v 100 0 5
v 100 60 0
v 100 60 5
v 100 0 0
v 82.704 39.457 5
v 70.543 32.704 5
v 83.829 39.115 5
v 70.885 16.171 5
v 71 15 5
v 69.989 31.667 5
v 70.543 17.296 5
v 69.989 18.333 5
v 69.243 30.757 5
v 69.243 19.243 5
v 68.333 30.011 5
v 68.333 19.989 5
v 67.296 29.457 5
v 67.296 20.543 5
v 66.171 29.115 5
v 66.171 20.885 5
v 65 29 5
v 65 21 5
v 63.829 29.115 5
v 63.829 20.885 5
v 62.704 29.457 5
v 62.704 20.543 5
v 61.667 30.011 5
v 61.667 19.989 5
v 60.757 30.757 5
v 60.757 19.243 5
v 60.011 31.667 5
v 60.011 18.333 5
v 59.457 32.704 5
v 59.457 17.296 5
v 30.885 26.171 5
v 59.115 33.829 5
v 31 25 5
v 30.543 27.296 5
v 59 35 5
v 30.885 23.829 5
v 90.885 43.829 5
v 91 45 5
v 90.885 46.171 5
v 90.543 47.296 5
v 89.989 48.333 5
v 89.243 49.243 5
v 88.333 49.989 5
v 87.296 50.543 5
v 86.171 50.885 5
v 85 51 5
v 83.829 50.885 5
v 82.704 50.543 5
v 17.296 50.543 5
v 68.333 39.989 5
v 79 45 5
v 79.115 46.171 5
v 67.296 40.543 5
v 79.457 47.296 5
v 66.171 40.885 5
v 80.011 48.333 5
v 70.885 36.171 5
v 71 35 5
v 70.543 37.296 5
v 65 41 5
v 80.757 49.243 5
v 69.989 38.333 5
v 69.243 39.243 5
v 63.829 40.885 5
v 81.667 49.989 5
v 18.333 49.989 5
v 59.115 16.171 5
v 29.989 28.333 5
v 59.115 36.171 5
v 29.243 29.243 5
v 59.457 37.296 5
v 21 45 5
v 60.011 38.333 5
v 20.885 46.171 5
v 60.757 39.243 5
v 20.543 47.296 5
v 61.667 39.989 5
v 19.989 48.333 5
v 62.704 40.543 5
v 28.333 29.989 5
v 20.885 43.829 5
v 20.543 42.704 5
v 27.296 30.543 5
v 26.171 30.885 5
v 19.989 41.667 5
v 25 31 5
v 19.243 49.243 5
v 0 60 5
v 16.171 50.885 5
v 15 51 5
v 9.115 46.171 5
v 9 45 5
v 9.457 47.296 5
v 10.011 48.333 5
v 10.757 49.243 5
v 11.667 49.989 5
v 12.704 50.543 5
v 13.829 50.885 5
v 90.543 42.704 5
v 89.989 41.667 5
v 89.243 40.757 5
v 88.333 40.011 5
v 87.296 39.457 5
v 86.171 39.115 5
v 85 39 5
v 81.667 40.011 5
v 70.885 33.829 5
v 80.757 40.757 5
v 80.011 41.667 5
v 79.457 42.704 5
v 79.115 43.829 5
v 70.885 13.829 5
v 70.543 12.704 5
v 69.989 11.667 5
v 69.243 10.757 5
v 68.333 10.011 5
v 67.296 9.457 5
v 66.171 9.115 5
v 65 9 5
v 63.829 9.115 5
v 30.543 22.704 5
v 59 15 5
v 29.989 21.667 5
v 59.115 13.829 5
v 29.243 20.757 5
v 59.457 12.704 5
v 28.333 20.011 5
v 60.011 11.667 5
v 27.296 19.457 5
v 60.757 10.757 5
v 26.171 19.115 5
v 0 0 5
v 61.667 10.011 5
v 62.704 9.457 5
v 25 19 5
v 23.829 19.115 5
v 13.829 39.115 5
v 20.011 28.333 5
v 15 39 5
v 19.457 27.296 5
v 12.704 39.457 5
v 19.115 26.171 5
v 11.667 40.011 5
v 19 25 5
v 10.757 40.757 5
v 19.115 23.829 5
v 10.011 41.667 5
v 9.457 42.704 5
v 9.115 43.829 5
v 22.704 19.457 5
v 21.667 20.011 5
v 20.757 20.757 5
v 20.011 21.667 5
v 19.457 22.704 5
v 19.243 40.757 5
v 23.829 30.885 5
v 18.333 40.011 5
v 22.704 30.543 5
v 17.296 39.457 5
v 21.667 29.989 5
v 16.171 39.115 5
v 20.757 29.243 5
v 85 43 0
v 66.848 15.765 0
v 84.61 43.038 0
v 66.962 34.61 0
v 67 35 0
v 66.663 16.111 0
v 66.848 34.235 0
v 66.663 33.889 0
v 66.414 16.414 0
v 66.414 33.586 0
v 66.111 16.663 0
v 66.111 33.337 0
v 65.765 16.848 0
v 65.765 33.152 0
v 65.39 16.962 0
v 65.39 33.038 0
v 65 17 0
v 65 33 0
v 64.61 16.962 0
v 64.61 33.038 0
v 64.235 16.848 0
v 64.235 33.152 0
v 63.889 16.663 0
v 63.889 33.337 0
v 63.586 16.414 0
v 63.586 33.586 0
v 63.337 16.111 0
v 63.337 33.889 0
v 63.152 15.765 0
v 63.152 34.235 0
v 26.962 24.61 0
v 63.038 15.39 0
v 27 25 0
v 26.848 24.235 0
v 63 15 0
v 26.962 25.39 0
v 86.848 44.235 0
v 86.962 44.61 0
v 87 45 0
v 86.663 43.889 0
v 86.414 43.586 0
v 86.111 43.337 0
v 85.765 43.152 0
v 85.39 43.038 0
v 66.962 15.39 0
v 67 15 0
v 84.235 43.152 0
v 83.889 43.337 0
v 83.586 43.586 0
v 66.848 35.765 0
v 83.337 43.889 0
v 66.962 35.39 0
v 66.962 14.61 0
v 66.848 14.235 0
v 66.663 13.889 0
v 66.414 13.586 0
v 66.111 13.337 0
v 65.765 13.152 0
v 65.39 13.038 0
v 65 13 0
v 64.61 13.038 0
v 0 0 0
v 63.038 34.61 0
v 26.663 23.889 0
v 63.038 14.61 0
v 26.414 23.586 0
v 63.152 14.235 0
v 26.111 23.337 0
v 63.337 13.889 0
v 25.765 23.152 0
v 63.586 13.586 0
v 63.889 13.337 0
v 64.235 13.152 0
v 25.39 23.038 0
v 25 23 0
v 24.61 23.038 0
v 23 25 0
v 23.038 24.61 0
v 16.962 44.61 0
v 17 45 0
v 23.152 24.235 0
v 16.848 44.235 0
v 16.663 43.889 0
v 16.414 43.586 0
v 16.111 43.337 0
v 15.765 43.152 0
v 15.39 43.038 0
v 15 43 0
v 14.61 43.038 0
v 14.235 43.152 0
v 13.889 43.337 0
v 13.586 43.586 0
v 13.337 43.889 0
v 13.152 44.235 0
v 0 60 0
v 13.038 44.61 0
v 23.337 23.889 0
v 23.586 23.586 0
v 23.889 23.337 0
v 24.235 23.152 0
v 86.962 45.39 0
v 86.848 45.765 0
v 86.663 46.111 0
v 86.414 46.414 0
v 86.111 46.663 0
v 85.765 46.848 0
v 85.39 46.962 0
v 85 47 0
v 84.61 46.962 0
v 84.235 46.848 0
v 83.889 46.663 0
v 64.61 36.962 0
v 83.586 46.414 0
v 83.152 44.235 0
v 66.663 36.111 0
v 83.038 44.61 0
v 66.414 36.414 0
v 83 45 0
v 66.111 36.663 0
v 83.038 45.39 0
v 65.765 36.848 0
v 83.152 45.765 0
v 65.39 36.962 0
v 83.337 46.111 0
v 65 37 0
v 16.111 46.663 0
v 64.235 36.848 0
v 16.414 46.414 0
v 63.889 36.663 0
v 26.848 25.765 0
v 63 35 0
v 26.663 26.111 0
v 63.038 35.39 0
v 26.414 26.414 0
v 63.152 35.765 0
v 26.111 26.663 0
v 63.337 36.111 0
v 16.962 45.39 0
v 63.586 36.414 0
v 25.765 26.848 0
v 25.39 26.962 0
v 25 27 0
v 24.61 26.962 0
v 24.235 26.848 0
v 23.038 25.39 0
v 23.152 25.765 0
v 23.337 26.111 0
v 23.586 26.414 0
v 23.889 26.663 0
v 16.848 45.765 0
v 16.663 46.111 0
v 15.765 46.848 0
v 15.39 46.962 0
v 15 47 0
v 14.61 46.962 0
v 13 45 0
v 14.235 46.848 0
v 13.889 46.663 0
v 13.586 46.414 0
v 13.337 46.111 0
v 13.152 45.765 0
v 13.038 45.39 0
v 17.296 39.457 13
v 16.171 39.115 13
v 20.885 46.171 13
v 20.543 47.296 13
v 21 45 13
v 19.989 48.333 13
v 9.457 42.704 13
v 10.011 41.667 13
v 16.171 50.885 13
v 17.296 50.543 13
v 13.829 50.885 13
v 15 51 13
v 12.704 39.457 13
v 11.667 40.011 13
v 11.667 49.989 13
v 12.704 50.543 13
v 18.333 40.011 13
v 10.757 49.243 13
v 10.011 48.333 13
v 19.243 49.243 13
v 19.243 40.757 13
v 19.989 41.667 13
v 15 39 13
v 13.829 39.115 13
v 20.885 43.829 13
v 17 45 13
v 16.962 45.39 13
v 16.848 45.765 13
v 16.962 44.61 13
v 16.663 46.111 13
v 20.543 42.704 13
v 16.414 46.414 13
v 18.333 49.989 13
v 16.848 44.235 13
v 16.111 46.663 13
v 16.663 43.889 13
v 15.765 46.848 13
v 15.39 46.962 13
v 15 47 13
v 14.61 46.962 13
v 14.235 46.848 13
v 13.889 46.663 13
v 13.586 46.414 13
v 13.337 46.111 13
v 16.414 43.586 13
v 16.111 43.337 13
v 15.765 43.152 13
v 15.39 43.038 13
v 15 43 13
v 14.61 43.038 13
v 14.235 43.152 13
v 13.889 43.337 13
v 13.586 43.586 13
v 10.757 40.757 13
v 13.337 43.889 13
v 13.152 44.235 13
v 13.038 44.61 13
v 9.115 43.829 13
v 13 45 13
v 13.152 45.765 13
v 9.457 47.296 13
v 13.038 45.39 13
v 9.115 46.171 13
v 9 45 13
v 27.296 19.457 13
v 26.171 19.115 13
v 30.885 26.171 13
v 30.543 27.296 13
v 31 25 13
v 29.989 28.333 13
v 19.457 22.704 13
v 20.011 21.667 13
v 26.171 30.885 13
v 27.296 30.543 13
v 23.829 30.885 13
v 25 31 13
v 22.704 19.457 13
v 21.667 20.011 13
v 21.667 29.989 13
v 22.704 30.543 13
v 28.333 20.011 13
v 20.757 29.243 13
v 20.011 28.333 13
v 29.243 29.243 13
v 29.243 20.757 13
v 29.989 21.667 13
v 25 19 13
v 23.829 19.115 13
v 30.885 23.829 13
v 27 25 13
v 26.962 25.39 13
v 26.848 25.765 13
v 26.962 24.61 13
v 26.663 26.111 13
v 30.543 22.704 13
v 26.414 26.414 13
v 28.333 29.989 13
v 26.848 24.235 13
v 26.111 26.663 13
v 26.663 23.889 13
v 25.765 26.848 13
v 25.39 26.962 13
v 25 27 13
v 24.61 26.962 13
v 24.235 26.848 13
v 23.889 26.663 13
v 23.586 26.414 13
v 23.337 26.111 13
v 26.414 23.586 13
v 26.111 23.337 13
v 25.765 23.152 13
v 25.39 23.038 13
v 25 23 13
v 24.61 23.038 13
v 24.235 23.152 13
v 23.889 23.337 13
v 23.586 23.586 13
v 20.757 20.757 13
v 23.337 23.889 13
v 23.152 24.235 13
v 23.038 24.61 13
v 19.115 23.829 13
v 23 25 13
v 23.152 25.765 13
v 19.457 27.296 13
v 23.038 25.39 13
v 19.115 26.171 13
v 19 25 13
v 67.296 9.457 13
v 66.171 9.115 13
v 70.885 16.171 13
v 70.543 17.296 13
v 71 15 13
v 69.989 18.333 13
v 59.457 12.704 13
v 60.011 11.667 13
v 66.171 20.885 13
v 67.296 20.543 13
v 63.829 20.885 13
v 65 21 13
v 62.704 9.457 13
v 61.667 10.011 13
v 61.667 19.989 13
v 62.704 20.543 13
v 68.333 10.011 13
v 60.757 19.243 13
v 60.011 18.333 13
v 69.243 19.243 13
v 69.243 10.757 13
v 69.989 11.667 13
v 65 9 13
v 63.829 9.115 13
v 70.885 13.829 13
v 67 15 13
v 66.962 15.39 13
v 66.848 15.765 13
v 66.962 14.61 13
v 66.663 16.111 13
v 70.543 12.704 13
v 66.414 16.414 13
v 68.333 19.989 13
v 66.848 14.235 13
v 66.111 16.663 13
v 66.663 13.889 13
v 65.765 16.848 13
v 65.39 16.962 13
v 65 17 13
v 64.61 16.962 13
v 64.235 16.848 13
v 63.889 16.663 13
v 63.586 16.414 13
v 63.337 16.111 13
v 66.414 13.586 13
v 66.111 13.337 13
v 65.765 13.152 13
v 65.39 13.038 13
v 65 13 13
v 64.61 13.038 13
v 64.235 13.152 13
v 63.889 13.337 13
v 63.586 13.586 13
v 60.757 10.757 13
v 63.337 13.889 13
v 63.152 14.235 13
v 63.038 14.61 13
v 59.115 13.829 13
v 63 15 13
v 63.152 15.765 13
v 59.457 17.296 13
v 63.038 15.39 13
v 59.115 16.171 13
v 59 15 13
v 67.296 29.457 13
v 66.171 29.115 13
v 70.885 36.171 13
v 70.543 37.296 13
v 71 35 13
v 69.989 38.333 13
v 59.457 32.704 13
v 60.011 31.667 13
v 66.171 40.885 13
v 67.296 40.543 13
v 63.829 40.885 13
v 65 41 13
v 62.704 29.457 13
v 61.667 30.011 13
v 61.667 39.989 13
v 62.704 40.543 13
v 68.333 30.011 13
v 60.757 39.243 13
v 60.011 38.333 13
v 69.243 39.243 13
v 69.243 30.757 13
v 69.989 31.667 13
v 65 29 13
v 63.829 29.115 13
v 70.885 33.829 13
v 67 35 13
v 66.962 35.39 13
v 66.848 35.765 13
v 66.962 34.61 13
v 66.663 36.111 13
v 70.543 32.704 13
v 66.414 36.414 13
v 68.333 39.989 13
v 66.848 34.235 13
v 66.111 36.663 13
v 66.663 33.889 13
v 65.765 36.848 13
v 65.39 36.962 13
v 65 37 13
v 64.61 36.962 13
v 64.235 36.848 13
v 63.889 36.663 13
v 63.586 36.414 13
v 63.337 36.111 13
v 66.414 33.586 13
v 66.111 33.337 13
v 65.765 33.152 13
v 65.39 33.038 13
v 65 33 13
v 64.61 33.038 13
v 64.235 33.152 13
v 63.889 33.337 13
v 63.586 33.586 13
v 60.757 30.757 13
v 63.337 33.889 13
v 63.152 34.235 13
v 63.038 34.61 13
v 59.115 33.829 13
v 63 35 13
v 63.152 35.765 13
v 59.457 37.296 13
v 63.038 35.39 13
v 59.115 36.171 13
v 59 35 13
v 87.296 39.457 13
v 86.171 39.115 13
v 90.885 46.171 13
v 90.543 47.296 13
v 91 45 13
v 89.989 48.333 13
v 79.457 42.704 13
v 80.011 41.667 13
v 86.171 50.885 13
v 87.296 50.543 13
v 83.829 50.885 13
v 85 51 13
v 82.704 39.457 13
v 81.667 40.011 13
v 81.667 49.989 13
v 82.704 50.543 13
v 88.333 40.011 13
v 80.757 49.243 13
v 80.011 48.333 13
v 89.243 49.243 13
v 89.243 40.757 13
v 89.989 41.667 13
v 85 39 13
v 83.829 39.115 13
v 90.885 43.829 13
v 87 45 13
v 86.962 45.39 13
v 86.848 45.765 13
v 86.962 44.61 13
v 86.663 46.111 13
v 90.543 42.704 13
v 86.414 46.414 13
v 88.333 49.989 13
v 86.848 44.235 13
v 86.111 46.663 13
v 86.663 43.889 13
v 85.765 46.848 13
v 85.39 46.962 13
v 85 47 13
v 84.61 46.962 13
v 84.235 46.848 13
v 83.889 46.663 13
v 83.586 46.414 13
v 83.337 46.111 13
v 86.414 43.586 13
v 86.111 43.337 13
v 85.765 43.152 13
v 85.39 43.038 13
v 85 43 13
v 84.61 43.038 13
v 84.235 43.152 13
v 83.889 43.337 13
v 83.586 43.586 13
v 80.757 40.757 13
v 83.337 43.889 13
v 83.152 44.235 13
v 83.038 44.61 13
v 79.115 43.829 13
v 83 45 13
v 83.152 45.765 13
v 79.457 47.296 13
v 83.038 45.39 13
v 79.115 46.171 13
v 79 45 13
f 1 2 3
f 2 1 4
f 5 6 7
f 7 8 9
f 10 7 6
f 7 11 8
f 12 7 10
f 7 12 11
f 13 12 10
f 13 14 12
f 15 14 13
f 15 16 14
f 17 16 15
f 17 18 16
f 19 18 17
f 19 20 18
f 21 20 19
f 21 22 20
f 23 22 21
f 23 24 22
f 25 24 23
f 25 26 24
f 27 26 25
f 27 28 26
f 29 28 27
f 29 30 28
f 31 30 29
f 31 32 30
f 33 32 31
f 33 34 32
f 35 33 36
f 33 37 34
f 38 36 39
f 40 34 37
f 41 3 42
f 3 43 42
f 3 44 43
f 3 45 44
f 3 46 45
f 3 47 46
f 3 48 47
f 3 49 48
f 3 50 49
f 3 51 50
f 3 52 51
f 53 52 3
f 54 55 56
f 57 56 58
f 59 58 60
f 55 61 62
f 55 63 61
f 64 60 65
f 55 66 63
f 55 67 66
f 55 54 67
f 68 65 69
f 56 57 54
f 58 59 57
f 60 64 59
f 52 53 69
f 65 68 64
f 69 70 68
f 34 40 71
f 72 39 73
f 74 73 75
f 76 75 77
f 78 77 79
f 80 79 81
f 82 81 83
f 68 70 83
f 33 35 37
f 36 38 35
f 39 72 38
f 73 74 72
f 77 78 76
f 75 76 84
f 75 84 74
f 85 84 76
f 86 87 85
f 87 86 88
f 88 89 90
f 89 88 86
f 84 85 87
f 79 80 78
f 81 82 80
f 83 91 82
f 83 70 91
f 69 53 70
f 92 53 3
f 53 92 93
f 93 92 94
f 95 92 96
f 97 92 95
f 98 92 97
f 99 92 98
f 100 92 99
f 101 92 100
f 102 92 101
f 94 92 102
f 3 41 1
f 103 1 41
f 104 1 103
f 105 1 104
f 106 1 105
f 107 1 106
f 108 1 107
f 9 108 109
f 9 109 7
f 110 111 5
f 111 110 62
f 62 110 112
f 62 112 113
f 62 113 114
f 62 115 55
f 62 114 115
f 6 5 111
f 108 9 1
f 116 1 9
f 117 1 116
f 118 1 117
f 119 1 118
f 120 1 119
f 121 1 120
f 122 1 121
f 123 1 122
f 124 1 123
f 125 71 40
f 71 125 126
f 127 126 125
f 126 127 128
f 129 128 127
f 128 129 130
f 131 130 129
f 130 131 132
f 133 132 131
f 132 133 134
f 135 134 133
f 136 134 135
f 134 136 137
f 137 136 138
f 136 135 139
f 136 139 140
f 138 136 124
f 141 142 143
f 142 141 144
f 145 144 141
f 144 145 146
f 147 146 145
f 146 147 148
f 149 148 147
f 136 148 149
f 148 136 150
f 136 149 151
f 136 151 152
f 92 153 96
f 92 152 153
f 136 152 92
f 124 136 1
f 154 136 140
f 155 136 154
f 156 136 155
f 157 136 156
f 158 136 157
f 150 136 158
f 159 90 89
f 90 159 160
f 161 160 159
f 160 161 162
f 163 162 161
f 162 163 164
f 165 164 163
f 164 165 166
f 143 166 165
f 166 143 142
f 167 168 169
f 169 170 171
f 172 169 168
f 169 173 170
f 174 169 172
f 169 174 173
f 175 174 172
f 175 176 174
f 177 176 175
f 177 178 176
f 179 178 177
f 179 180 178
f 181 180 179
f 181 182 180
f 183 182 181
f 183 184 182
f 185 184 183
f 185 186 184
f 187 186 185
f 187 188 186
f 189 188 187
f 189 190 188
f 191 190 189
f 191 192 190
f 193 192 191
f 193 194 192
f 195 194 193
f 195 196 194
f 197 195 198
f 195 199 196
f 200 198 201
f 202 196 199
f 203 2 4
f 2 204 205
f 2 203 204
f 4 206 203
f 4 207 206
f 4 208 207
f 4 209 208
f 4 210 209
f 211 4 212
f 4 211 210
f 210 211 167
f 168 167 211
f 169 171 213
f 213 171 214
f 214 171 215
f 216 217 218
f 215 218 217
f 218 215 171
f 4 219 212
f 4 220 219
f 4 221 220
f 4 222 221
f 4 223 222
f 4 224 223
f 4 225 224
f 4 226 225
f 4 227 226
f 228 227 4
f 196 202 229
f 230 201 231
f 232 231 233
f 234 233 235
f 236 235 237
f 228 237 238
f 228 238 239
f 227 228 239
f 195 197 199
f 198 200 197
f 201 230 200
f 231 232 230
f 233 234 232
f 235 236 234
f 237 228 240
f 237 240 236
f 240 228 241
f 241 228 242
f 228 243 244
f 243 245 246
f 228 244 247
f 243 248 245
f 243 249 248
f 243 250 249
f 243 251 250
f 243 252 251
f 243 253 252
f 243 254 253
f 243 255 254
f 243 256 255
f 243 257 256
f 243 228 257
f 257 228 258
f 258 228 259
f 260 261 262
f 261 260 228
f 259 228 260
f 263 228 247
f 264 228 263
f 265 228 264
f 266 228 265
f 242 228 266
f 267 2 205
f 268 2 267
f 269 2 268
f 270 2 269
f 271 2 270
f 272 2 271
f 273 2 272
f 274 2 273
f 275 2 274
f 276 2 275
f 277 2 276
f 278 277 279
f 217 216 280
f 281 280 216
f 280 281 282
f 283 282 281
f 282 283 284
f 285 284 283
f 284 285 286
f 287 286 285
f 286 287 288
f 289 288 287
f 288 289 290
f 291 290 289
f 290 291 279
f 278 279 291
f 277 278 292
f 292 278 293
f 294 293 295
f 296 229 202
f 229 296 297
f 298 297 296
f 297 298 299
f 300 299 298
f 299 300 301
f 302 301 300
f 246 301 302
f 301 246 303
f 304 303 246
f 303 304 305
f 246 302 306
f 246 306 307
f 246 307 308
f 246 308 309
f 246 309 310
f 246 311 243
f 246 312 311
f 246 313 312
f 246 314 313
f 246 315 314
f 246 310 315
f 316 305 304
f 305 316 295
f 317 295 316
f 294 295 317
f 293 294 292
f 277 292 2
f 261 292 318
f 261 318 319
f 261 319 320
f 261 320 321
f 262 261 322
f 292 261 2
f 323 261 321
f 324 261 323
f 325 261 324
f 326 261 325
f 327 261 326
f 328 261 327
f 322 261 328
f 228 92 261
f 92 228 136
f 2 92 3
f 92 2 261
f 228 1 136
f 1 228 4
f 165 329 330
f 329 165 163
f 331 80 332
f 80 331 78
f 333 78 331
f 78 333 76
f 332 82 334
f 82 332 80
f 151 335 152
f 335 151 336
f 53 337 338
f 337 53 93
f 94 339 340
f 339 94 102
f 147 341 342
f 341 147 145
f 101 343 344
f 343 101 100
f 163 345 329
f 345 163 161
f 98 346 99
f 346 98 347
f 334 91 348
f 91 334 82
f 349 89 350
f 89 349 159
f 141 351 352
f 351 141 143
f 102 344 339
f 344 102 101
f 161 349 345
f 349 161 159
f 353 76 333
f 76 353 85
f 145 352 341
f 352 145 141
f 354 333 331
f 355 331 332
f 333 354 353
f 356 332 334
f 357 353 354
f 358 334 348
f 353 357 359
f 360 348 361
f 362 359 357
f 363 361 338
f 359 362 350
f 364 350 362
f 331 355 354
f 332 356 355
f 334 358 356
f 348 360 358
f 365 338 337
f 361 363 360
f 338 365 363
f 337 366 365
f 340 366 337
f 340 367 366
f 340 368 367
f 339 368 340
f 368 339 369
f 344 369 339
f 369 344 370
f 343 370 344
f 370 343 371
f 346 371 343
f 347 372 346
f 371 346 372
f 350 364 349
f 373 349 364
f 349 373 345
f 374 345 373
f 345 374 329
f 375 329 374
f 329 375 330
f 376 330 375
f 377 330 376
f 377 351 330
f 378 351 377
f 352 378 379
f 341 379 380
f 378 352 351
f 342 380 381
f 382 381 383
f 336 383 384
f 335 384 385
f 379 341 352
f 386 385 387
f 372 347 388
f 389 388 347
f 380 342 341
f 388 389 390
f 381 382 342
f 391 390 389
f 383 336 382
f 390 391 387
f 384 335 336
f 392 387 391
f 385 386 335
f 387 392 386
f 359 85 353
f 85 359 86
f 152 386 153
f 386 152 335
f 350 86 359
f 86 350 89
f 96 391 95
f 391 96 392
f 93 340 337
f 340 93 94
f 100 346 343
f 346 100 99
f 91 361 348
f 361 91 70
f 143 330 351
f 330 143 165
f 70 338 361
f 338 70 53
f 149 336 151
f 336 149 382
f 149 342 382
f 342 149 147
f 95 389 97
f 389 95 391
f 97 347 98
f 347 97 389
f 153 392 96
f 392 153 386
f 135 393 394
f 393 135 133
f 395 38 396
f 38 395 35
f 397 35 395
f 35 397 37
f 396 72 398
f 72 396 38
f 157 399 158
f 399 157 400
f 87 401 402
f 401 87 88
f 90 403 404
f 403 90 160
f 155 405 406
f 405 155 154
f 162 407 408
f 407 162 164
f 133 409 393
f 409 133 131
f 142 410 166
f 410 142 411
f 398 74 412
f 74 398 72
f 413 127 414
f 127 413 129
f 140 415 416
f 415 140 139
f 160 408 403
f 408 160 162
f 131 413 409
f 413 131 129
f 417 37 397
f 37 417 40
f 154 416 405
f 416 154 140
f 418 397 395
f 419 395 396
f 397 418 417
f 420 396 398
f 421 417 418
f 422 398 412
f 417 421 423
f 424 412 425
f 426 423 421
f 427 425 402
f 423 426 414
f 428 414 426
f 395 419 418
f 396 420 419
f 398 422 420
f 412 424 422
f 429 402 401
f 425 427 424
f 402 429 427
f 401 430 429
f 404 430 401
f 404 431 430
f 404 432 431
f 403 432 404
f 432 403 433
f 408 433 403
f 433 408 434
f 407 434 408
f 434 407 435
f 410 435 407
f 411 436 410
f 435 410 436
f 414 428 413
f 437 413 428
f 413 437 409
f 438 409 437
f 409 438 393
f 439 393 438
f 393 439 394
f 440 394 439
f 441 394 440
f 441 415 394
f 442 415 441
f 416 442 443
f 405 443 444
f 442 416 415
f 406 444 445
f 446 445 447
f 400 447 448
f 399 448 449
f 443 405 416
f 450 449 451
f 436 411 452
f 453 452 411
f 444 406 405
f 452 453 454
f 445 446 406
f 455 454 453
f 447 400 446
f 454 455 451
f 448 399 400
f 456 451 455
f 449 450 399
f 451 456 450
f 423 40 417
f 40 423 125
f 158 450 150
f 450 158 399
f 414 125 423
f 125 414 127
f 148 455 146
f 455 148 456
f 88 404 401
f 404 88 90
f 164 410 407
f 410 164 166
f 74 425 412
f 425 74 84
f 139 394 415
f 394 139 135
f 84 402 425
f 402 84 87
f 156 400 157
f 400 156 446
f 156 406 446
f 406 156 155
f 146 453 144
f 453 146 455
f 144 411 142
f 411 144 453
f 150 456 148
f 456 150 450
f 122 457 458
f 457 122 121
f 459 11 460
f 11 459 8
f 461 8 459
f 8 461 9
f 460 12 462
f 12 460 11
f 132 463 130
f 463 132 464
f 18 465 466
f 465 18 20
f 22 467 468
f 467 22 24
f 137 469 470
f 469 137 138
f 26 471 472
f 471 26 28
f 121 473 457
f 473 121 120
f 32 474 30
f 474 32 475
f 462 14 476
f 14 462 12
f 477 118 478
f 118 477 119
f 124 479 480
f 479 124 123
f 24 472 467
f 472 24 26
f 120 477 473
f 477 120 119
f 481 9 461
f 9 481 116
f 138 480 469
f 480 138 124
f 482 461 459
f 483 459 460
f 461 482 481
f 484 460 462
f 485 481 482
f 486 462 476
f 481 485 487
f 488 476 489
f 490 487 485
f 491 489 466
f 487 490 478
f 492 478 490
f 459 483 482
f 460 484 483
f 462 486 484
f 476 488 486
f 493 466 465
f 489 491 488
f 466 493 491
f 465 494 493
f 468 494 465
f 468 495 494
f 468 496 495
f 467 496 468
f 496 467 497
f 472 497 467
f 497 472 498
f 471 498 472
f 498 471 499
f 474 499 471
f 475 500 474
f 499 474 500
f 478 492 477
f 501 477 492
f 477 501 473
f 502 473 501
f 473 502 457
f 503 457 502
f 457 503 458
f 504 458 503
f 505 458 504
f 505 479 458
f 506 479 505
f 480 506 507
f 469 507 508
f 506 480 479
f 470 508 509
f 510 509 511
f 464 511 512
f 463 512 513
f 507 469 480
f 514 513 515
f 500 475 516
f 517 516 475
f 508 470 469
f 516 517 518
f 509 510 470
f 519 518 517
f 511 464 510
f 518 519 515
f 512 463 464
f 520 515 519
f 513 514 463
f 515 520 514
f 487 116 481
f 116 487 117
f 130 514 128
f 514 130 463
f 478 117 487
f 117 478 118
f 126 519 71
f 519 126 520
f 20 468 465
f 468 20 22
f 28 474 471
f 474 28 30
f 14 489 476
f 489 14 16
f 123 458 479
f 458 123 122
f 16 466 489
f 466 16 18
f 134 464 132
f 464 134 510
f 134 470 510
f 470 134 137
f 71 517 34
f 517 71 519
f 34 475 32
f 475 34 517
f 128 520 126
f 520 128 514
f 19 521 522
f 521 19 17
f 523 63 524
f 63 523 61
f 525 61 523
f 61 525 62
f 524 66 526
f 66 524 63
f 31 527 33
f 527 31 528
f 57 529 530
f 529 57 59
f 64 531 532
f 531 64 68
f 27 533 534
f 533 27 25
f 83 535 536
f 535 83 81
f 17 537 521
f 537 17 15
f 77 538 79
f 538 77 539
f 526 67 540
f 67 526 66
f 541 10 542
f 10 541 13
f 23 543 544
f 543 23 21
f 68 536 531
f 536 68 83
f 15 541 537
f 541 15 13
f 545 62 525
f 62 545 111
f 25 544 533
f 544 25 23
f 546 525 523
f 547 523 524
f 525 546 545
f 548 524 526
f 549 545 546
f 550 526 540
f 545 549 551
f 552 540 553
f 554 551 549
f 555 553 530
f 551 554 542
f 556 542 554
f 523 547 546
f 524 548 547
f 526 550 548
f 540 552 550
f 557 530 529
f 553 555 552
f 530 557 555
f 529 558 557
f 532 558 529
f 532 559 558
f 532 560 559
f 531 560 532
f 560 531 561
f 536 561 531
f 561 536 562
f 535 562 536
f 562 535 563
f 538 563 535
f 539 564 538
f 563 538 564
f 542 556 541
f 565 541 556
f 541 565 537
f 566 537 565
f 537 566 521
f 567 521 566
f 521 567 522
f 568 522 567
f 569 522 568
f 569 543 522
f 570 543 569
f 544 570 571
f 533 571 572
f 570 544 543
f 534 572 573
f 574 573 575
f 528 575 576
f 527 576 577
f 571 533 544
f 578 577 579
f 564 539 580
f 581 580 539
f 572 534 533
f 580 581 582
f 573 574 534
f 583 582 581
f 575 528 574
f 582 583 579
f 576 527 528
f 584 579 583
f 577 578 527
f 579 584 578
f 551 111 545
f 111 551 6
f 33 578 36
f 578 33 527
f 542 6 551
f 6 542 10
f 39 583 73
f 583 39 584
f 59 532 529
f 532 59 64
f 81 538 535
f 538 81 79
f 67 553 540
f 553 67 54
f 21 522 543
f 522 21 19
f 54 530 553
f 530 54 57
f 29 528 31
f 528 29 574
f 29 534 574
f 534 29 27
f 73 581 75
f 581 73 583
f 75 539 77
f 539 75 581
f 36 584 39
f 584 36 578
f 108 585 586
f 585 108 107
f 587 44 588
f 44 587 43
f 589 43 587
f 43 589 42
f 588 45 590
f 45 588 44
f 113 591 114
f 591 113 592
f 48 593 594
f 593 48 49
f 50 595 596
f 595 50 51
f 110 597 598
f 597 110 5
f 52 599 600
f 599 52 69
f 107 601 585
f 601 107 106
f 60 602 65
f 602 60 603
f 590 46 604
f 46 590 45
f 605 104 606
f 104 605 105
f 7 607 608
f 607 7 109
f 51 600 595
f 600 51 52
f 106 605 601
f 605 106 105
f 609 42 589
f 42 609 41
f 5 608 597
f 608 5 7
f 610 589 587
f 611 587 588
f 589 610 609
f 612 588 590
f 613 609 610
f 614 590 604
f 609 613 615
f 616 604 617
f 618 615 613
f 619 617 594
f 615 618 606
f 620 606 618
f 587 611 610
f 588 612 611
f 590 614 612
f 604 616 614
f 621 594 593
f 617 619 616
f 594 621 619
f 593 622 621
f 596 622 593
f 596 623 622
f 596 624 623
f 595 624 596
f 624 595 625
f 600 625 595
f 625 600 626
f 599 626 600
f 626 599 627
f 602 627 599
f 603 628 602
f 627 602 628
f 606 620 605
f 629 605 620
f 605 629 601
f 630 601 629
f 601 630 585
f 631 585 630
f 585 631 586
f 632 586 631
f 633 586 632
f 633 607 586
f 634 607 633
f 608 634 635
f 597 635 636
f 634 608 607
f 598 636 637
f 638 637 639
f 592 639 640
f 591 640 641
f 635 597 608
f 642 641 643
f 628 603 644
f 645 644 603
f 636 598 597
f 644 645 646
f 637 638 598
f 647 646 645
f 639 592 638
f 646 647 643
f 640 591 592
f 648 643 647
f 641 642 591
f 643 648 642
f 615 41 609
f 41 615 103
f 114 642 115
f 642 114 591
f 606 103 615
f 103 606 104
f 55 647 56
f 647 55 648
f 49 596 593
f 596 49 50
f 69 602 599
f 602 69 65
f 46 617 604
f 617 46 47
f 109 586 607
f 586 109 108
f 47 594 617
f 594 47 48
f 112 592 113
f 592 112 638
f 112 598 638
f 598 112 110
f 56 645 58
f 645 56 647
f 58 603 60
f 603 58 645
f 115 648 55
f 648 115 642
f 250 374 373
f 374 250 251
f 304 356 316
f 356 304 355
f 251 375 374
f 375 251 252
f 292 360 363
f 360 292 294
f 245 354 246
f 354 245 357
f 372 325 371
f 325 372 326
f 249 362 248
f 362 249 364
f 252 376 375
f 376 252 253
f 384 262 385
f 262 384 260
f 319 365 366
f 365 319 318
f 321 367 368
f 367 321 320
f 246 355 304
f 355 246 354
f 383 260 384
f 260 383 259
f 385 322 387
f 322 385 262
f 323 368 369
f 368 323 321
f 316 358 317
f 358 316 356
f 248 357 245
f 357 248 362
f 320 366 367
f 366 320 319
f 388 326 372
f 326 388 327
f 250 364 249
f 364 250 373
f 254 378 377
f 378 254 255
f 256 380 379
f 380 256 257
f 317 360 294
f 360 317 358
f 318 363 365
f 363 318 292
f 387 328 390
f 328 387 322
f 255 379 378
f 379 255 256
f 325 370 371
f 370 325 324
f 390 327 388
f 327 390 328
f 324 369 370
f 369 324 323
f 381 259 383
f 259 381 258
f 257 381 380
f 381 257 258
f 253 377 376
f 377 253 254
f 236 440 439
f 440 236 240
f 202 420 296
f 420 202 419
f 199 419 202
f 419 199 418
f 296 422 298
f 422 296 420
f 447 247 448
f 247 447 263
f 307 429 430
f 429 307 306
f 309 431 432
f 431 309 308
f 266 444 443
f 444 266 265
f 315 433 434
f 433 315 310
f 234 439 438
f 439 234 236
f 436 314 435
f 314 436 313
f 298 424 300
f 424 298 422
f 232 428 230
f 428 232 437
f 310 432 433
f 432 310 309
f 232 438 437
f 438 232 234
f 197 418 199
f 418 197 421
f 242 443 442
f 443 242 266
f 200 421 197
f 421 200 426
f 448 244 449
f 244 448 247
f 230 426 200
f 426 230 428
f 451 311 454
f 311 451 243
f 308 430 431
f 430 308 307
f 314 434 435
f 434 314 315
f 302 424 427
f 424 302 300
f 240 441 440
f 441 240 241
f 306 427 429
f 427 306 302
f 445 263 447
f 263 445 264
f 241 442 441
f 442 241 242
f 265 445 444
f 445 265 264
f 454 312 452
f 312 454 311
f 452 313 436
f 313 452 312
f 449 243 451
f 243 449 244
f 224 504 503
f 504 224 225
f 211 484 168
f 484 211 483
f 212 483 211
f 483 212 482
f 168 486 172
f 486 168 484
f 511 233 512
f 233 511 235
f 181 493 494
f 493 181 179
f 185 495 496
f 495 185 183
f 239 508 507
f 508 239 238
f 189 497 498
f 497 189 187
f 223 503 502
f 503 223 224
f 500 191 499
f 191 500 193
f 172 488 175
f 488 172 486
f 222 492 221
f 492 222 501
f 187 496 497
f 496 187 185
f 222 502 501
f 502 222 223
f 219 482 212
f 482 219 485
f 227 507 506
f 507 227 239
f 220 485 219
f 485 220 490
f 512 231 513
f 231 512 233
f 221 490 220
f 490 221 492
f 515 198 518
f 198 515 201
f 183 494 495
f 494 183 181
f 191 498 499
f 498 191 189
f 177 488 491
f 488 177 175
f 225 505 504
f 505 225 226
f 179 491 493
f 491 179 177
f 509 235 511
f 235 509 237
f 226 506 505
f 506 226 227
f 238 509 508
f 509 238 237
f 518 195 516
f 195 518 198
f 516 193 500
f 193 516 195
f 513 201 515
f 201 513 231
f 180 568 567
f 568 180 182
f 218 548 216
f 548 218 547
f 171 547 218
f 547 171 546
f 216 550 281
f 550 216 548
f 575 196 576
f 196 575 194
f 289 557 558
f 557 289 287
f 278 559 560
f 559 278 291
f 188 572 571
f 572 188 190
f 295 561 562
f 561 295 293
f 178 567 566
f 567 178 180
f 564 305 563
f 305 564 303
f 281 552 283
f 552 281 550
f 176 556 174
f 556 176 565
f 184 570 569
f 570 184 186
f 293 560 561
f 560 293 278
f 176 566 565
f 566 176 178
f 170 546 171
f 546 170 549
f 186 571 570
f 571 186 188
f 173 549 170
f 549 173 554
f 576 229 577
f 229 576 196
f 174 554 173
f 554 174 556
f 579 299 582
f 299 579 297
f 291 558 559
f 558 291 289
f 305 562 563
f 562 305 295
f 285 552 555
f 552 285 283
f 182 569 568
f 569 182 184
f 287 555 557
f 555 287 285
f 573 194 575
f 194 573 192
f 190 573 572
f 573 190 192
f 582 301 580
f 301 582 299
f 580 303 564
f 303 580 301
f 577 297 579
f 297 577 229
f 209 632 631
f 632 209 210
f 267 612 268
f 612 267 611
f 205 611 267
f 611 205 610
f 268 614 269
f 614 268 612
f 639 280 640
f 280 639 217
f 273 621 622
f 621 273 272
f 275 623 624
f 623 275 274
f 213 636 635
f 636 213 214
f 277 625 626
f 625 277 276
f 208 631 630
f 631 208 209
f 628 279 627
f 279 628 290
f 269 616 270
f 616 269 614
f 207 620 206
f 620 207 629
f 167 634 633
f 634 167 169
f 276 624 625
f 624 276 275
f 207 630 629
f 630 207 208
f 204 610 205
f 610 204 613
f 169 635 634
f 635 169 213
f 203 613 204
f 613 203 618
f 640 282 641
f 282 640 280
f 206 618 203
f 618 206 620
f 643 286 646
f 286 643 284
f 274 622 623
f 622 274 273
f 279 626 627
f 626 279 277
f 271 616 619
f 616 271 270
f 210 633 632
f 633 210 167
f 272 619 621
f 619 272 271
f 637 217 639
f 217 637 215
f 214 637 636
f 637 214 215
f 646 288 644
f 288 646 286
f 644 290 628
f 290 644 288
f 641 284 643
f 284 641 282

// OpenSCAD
$fn = 32;

// ----------------------------------------------------------------------
// Boss field: plate with bosses at given coordinates
// ----------------------------------------------------------------------

// --- parameters (mm) ---
plate_l = 100;            // plate length, X
plate_w = 60;             // plate width, Y
plate_t = 5;              // plate thickness, Z
boss_d = 12;              // boss diameter
boss_h = 8;               // boss height above the plate
bore_d = 4;               // boss bore

total_h = plate_t + boss_h;  // overall height

difference() {
  union() {
    cube([plate_l, plate_w, plate_t]);
    translate([15, 45, plate_t]) cylinder(h = boss_h, d = boss_d);
    translate([25, 25, plate_t]) cylinder(h = boss_h, d = boss_d);
    translate([65, 15, plate_t]) cylinder(h = boss_h, d = boss_d);
    translate([65, 35, plate_t]) cylinder(h = boss_h, d = boss_d);
    translate([85, 45, plate_t]) cylinder(h = boss_h, d = boss_d);
  }
  translate([15, 45, -1]) cylinder(h = total_h + 2, d = bore_d);
  translate([25, 25, -1]) cylinder(h = total_h + 2, d = bore_d);
  translate([65, 15, -1]) cylinder(h = total_h + 2, d = bore_d);
  translate([65, 35, -1]) cylinder(h = total_h + 2, d = bore_d);
  translate([85, 45, -1]) cylinder(h = total_h + 2, d = bore_d);
}
